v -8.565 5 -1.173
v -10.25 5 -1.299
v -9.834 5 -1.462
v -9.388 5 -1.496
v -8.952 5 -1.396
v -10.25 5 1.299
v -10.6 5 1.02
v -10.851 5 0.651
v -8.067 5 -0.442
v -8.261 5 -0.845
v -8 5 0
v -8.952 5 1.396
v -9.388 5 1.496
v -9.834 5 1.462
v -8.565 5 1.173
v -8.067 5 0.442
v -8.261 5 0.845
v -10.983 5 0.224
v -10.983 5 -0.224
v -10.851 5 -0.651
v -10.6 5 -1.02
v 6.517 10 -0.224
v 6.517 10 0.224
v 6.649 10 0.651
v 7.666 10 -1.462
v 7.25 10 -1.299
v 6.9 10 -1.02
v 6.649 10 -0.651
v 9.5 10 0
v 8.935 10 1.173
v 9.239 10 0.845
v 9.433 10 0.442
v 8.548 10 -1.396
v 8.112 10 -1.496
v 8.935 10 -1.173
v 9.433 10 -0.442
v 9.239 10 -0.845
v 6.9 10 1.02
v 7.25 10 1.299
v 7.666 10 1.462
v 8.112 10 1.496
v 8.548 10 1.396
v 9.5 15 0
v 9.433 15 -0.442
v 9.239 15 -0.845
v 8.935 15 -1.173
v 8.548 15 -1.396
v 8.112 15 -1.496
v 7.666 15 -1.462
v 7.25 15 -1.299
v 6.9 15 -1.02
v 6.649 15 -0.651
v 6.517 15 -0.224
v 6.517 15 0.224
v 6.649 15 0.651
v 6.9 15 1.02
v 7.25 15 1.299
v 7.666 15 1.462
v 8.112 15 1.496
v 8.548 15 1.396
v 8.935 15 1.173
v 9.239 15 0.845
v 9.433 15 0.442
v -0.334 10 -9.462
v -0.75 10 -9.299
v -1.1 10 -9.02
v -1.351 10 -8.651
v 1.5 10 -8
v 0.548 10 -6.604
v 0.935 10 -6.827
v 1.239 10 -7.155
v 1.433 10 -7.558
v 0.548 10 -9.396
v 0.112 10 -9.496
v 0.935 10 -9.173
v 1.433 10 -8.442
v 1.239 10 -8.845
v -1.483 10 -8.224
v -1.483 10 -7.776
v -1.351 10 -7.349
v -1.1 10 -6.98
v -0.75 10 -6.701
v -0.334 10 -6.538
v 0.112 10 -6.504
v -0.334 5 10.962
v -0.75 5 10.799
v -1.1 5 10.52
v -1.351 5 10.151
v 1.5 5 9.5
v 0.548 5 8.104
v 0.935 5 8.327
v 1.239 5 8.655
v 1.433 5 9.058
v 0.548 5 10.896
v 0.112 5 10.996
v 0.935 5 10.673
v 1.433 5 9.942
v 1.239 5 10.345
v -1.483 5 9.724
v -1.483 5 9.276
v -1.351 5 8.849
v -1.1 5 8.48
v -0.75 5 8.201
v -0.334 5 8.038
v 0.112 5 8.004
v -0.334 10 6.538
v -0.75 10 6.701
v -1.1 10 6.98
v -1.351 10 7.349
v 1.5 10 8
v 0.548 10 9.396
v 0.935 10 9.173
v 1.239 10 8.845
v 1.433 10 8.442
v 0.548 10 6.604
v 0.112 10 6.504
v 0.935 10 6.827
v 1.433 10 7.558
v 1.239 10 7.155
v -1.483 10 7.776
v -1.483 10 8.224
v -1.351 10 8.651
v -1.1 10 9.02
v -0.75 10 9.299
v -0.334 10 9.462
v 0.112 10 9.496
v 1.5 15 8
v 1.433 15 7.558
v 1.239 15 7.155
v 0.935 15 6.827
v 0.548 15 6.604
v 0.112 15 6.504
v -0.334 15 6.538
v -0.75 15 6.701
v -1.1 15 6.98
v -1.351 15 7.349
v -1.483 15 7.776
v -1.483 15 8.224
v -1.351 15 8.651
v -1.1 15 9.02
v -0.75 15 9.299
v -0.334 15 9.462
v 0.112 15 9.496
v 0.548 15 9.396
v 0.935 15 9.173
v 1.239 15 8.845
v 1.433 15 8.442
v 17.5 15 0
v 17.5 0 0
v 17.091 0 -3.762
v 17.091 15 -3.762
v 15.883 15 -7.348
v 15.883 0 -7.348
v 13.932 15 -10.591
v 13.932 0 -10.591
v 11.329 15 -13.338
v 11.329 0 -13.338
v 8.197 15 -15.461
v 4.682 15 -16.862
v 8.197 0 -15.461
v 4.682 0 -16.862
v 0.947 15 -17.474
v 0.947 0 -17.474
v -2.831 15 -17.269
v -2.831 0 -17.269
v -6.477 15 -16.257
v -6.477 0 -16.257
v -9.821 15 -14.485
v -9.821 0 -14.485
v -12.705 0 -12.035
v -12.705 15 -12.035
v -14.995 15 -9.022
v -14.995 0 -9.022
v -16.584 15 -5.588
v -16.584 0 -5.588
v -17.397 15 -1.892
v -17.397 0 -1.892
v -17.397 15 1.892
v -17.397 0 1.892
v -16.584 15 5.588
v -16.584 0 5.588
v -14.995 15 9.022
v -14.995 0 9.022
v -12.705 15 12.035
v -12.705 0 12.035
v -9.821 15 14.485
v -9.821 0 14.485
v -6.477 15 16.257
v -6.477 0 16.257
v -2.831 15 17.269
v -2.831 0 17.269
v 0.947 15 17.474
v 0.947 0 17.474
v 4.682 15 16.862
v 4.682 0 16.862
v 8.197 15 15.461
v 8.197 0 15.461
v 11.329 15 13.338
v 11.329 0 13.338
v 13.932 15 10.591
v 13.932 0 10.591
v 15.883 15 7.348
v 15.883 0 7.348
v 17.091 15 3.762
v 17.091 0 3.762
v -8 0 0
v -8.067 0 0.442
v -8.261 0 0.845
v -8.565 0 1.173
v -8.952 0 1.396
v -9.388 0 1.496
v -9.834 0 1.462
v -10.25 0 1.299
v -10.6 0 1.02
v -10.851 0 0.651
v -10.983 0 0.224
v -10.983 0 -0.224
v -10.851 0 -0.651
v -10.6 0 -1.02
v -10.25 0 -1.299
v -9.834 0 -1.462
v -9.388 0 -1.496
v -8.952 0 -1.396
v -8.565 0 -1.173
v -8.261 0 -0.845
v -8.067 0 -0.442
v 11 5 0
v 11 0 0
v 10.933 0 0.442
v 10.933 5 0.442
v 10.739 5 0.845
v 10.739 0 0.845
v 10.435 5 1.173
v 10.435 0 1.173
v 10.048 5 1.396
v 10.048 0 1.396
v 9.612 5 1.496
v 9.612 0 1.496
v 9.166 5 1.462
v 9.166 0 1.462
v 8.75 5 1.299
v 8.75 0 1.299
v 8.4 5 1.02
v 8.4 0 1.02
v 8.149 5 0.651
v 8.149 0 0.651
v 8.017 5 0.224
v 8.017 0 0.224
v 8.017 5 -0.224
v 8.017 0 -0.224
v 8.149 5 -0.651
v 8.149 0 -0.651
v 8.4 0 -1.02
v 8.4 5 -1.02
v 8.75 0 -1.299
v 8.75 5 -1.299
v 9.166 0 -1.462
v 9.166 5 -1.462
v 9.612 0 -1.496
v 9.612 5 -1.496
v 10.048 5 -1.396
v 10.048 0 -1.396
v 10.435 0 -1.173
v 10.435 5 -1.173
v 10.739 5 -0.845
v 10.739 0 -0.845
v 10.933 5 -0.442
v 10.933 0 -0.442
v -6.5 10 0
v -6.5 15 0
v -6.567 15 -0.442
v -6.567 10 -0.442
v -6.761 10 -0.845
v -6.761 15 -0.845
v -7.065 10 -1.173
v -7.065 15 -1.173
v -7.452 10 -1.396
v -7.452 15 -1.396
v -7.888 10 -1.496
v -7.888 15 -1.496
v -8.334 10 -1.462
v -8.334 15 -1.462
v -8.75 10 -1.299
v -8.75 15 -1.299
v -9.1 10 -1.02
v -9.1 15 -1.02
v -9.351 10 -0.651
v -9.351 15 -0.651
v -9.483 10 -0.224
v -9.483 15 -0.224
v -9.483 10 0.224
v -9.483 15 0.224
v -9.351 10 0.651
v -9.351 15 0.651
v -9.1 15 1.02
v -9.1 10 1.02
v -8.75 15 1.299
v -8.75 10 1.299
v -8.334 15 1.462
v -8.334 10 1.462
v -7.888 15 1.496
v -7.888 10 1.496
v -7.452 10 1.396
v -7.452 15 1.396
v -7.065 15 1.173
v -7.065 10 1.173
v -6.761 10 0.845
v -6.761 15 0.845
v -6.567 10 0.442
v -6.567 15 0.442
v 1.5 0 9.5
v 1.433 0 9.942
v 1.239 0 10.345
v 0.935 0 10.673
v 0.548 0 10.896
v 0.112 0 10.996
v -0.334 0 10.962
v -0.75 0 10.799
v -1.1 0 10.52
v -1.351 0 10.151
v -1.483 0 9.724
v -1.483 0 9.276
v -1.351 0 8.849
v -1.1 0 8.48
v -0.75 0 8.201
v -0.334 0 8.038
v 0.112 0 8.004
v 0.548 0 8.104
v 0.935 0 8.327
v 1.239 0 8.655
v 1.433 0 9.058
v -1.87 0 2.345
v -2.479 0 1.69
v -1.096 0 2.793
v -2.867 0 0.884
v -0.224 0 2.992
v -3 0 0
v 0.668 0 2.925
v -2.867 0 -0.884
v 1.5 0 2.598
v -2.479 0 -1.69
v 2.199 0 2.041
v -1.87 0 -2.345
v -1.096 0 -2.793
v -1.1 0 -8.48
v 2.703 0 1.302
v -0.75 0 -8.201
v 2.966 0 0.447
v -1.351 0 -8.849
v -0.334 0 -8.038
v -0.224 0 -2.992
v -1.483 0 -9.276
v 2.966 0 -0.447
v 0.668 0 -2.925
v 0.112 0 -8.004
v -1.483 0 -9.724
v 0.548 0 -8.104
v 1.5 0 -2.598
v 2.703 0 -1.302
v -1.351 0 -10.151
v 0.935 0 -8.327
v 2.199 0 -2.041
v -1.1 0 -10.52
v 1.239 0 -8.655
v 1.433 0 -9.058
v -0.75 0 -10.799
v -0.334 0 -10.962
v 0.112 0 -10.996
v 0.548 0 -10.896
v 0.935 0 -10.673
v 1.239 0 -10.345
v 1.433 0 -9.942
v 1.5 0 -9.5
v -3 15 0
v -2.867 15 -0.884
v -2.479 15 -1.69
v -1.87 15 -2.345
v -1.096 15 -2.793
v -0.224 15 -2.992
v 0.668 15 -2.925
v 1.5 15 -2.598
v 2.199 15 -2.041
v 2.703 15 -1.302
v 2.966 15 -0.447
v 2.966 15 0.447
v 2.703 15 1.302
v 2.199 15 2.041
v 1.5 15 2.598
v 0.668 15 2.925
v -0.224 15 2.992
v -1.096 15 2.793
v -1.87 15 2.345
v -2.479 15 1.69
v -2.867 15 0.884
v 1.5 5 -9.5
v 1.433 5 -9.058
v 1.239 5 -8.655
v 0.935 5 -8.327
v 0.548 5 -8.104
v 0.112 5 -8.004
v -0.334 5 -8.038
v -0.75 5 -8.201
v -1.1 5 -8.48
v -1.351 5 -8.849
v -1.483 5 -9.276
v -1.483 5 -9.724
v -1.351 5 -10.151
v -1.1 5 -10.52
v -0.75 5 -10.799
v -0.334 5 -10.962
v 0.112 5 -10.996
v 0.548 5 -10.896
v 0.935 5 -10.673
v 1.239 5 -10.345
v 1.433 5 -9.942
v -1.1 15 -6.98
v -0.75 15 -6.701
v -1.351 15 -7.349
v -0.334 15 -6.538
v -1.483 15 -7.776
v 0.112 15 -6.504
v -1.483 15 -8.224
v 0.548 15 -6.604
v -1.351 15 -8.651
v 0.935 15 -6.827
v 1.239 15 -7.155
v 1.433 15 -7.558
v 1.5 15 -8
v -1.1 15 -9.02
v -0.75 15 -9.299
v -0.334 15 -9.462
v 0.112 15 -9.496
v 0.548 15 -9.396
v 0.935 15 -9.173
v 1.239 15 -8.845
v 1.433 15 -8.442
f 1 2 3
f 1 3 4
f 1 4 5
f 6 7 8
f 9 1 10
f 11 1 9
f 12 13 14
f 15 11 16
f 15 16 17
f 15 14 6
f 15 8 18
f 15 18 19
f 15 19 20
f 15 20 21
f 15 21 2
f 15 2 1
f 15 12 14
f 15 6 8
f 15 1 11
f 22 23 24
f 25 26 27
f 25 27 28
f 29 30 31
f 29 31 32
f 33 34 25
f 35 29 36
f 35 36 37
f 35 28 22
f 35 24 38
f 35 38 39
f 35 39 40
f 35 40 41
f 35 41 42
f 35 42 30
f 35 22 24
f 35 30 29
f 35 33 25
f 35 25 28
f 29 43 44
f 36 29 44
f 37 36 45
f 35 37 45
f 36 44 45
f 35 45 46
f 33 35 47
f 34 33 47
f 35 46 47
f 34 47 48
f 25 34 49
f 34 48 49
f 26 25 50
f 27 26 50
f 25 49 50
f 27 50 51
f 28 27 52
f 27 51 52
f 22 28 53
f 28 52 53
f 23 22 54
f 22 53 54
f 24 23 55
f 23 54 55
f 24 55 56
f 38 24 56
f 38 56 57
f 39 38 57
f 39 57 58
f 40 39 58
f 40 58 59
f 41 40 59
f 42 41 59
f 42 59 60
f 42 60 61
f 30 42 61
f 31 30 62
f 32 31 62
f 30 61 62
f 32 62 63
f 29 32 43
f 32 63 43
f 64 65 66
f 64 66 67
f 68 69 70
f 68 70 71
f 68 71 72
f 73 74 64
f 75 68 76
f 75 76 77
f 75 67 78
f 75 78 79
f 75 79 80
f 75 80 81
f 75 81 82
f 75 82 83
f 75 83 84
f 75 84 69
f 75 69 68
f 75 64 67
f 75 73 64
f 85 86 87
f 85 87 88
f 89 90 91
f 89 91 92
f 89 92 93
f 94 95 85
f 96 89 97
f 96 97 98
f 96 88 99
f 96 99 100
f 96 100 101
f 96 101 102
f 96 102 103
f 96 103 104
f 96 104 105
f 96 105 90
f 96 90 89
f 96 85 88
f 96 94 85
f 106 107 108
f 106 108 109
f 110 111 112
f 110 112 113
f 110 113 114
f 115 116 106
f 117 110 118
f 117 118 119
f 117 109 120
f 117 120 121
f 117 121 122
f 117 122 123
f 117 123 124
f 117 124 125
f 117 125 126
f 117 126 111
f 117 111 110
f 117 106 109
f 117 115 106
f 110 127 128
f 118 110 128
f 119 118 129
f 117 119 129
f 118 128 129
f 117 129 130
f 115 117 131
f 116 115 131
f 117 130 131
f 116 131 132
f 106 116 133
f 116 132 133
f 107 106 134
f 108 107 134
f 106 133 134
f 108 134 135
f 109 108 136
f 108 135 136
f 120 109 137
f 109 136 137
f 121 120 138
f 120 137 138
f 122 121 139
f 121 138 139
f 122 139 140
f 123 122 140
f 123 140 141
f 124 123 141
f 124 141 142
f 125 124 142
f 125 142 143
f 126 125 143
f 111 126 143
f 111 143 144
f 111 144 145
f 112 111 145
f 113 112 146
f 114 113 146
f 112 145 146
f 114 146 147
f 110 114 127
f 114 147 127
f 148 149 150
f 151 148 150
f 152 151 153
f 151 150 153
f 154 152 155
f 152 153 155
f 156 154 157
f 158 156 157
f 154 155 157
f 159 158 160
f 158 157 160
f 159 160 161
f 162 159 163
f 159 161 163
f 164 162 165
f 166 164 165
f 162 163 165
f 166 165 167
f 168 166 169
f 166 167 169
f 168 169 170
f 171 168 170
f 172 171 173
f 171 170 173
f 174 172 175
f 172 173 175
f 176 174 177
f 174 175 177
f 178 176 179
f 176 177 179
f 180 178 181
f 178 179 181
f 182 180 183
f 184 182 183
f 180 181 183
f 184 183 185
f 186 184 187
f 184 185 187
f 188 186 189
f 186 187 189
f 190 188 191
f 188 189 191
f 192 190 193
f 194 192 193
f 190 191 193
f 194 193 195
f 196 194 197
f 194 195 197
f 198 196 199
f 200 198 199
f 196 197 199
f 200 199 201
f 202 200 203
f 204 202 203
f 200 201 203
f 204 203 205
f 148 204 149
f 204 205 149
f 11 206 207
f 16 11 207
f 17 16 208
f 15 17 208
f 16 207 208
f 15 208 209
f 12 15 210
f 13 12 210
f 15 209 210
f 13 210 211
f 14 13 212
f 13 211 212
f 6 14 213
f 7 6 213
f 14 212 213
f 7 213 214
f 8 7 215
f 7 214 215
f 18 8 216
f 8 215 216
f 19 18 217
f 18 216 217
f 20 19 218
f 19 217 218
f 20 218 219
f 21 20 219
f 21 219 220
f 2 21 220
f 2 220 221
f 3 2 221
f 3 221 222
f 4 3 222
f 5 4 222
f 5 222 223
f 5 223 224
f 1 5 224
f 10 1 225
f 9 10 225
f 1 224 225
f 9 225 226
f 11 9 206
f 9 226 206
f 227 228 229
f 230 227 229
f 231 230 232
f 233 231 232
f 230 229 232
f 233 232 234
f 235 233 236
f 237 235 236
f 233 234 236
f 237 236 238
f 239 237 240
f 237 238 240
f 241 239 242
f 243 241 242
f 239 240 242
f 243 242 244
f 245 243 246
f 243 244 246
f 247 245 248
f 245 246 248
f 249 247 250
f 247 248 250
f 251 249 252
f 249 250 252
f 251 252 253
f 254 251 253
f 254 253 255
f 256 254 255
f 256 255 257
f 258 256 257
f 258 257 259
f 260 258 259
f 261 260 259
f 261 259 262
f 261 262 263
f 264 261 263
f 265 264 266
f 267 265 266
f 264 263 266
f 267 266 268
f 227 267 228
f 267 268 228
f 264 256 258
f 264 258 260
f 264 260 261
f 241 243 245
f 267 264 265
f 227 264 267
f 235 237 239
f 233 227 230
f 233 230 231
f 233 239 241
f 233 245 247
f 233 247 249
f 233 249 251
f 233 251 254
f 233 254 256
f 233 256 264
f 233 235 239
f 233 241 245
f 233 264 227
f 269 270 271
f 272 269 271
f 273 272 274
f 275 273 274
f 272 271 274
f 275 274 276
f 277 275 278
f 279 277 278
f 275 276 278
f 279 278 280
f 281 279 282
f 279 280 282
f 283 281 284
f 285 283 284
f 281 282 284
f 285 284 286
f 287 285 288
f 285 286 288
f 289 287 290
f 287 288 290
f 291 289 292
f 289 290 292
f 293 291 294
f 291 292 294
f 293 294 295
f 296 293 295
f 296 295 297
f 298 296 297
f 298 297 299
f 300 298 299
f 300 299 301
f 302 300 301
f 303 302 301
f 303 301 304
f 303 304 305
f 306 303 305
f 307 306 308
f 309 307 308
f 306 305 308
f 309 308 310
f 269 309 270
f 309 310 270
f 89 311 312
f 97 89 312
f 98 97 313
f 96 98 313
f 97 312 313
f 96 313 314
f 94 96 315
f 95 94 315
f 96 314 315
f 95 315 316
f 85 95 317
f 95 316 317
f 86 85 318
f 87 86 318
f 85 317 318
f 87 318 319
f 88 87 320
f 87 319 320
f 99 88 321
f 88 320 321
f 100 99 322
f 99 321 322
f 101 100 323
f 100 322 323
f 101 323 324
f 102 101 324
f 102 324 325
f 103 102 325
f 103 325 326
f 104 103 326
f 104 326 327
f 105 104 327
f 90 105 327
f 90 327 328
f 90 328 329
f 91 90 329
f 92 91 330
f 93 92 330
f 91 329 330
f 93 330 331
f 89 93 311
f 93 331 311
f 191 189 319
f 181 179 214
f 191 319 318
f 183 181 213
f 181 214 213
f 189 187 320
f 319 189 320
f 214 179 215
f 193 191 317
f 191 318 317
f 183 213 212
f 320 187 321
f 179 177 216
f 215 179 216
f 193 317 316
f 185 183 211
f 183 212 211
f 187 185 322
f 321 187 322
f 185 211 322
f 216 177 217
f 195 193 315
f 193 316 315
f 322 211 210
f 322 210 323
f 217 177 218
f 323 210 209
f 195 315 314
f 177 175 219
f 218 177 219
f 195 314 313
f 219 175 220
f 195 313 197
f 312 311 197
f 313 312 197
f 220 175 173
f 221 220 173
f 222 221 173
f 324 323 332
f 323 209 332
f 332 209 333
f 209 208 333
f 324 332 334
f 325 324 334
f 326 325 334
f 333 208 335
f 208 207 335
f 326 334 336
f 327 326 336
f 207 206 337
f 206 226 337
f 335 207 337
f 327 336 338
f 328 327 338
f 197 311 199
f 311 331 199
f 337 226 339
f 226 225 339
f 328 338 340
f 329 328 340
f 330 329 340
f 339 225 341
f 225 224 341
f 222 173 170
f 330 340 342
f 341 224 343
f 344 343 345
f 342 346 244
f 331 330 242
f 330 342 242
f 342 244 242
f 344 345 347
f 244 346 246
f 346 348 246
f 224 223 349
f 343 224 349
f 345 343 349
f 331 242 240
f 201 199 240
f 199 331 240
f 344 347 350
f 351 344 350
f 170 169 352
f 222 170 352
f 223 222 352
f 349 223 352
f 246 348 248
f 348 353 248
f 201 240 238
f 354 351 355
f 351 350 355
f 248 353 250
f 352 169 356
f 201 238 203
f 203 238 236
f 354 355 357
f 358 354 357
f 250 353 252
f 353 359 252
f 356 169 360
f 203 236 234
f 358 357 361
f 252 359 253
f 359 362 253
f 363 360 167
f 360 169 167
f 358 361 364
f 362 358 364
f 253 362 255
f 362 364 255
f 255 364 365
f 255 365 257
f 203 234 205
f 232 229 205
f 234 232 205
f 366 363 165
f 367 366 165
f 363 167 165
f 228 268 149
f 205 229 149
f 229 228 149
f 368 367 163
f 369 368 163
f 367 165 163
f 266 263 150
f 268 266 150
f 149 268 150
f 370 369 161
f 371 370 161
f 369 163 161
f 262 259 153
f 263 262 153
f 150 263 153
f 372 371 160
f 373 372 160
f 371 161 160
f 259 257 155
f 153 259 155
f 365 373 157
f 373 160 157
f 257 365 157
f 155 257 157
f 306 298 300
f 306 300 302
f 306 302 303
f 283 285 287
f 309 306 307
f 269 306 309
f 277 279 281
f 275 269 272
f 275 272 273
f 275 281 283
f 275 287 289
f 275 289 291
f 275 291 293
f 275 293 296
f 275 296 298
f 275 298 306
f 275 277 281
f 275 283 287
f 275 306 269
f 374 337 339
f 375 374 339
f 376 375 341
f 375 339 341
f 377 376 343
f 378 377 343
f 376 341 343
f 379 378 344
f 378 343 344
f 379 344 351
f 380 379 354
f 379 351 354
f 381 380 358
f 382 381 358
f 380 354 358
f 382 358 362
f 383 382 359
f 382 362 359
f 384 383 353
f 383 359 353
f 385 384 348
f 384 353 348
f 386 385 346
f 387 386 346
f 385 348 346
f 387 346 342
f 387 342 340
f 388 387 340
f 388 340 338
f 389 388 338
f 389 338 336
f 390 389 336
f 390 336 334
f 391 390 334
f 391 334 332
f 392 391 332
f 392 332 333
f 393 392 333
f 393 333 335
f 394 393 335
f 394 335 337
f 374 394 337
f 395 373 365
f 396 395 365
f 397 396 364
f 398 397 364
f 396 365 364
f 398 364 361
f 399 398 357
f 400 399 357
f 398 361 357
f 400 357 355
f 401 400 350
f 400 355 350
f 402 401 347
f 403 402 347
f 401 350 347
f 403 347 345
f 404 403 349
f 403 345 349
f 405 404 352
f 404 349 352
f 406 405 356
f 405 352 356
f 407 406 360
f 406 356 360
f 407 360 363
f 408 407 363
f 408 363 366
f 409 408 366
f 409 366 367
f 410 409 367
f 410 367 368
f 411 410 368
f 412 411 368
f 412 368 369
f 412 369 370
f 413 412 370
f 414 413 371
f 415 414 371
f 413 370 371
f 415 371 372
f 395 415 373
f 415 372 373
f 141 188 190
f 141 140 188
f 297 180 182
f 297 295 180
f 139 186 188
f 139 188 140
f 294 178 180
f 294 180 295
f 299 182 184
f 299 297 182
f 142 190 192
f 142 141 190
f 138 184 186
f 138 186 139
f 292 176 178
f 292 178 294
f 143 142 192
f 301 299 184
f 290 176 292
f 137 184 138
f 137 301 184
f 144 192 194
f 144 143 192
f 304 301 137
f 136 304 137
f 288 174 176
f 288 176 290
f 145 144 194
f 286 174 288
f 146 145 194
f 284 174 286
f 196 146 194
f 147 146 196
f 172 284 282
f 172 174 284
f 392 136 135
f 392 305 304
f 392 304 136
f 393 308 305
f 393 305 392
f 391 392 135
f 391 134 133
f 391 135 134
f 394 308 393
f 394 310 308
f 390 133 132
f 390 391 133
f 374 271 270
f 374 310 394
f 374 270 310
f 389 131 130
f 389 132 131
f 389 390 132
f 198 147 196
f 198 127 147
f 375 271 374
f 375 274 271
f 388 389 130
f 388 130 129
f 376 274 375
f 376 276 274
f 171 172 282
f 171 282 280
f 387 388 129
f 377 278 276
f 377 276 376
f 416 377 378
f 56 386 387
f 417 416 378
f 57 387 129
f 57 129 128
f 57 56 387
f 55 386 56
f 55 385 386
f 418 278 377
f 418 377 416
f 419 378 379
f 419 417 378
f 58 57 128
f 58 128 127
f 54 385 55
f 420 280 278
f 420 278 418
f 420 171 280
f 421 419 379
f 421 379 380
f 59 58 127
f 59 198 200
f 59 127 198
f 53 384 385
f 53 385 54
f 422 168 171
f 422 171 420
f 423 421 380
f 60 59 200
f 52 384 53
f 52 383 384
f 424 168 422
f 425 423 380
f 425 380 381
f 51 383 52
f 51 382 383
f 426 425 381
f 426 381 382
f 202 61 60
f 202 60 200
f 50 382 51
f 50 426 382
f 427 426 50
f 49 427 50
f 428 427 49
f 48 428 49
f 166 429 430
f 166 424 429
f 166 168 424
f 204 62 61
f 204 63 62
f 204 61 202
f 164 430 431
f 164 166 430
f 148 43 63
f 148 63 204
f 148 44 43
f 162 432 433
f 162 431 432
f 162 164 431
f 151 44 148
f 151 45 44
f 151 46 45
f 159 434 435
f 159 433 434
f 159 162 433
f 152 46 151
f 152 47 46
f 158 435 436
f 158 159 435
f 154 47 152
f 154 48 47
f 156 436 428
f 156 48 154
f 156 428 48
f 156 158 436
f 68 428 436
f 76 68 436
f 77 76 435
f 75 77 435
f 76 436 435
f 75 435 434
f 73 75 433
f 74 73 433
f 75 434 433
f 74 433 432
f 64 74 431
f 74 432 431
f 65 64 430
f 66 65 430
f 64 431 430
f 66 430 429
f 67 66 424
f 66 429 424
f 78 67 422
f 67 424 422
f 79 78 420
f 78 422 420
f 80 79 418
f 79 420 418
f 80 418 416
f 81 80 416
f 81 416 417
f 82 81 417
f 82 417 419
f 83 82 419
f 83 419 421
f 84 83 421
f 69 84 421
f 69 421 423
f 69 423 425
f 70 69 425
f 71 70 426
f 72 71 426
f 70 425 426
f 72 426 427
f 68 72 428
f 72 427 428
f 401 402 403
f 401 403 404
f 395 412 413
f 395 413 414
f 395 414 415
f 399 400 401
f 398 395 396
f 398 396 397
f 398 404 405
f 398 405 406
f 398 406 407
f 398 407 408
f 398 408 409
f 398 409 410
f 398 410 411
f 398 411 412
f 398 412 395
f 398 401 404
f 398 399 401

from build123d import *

# Parameters (mm, degrees)
SKETCH_1_R          = 17.5
EXTRUDE_1_DEPTH     = 15
SKETCH_2_R          = 3
CUT_EXTRUDE_1_DEPTH = 16
SKETCH_3_R          = 1.5
CUT_EXTRUDE_2_DEPTH = 5
SKETCH_4_R          = 1.5
CUT_EXTRUDE_3_DEPTH = 5


with BuildPart() as part:
    # 草图1 → 凸台-拉伸1 (new body)
    with BuildSketch(Plane(origin=(0, 0, 0), x_dir=(1, 0, 0), z_dir=(0, 1, 0))):
        Circle(SKETCH_1_R)
    extrude(amount=EXTRUDE_1_DEPTH)

    # 草图2 → 切除-拉伸1 (cut, through all)
    with BuildSketch(Plane(origin=(0, 0, 0), x_dir=(-1, 0, 0), z_dir=(0, -1, 0))):
        Circle(SKETCH_2_R)
    extrude(amount=-CUT_EXTRUDE_1_DEPTH, mode=Mode.SUBTRACT)

    # 草图3 → 切除-拉伸2 (cut)
    with BuildSketch(Plane(origin=(0, 15, 0), x_dir=(1, 0, 0), z_dir=(0, 1, 0))):
        with Locations((0, 8)):
            Circle(SKETCH_3_R)
        with Locations((8, 0)):
            Circle(SKETCH_3_R)
        with Locations((0, -8)):
            Circle(SKETCH_3_R)
        with Locations((-8, 0)):
            Circle(SKETCH_3_R)
    extrude(amount=-CUT_EXTRUDE_2_DEPTH, mode=Mode.SUBTRACT)

    # 草图4 → 切除-拉伸3 (cut)
    with BuildSketch(Plane.XZ):
        with Locations((0, 9.5)):
            Circle(SKETCH_4_R)
        with Locations((9.5, 0)):
            Circle(SKETCH_4_R)
        with Locations((0, -9.5)):
            Circle(SKETCH_4_R)
        with Locations((-9.5, 0)):
            Circle(SKETCH_4_R)
    extrude(amount=-CUT_EXTRUDE_3_DEPTH, mode=Mode.SUBTRACT)


solid = part.part
